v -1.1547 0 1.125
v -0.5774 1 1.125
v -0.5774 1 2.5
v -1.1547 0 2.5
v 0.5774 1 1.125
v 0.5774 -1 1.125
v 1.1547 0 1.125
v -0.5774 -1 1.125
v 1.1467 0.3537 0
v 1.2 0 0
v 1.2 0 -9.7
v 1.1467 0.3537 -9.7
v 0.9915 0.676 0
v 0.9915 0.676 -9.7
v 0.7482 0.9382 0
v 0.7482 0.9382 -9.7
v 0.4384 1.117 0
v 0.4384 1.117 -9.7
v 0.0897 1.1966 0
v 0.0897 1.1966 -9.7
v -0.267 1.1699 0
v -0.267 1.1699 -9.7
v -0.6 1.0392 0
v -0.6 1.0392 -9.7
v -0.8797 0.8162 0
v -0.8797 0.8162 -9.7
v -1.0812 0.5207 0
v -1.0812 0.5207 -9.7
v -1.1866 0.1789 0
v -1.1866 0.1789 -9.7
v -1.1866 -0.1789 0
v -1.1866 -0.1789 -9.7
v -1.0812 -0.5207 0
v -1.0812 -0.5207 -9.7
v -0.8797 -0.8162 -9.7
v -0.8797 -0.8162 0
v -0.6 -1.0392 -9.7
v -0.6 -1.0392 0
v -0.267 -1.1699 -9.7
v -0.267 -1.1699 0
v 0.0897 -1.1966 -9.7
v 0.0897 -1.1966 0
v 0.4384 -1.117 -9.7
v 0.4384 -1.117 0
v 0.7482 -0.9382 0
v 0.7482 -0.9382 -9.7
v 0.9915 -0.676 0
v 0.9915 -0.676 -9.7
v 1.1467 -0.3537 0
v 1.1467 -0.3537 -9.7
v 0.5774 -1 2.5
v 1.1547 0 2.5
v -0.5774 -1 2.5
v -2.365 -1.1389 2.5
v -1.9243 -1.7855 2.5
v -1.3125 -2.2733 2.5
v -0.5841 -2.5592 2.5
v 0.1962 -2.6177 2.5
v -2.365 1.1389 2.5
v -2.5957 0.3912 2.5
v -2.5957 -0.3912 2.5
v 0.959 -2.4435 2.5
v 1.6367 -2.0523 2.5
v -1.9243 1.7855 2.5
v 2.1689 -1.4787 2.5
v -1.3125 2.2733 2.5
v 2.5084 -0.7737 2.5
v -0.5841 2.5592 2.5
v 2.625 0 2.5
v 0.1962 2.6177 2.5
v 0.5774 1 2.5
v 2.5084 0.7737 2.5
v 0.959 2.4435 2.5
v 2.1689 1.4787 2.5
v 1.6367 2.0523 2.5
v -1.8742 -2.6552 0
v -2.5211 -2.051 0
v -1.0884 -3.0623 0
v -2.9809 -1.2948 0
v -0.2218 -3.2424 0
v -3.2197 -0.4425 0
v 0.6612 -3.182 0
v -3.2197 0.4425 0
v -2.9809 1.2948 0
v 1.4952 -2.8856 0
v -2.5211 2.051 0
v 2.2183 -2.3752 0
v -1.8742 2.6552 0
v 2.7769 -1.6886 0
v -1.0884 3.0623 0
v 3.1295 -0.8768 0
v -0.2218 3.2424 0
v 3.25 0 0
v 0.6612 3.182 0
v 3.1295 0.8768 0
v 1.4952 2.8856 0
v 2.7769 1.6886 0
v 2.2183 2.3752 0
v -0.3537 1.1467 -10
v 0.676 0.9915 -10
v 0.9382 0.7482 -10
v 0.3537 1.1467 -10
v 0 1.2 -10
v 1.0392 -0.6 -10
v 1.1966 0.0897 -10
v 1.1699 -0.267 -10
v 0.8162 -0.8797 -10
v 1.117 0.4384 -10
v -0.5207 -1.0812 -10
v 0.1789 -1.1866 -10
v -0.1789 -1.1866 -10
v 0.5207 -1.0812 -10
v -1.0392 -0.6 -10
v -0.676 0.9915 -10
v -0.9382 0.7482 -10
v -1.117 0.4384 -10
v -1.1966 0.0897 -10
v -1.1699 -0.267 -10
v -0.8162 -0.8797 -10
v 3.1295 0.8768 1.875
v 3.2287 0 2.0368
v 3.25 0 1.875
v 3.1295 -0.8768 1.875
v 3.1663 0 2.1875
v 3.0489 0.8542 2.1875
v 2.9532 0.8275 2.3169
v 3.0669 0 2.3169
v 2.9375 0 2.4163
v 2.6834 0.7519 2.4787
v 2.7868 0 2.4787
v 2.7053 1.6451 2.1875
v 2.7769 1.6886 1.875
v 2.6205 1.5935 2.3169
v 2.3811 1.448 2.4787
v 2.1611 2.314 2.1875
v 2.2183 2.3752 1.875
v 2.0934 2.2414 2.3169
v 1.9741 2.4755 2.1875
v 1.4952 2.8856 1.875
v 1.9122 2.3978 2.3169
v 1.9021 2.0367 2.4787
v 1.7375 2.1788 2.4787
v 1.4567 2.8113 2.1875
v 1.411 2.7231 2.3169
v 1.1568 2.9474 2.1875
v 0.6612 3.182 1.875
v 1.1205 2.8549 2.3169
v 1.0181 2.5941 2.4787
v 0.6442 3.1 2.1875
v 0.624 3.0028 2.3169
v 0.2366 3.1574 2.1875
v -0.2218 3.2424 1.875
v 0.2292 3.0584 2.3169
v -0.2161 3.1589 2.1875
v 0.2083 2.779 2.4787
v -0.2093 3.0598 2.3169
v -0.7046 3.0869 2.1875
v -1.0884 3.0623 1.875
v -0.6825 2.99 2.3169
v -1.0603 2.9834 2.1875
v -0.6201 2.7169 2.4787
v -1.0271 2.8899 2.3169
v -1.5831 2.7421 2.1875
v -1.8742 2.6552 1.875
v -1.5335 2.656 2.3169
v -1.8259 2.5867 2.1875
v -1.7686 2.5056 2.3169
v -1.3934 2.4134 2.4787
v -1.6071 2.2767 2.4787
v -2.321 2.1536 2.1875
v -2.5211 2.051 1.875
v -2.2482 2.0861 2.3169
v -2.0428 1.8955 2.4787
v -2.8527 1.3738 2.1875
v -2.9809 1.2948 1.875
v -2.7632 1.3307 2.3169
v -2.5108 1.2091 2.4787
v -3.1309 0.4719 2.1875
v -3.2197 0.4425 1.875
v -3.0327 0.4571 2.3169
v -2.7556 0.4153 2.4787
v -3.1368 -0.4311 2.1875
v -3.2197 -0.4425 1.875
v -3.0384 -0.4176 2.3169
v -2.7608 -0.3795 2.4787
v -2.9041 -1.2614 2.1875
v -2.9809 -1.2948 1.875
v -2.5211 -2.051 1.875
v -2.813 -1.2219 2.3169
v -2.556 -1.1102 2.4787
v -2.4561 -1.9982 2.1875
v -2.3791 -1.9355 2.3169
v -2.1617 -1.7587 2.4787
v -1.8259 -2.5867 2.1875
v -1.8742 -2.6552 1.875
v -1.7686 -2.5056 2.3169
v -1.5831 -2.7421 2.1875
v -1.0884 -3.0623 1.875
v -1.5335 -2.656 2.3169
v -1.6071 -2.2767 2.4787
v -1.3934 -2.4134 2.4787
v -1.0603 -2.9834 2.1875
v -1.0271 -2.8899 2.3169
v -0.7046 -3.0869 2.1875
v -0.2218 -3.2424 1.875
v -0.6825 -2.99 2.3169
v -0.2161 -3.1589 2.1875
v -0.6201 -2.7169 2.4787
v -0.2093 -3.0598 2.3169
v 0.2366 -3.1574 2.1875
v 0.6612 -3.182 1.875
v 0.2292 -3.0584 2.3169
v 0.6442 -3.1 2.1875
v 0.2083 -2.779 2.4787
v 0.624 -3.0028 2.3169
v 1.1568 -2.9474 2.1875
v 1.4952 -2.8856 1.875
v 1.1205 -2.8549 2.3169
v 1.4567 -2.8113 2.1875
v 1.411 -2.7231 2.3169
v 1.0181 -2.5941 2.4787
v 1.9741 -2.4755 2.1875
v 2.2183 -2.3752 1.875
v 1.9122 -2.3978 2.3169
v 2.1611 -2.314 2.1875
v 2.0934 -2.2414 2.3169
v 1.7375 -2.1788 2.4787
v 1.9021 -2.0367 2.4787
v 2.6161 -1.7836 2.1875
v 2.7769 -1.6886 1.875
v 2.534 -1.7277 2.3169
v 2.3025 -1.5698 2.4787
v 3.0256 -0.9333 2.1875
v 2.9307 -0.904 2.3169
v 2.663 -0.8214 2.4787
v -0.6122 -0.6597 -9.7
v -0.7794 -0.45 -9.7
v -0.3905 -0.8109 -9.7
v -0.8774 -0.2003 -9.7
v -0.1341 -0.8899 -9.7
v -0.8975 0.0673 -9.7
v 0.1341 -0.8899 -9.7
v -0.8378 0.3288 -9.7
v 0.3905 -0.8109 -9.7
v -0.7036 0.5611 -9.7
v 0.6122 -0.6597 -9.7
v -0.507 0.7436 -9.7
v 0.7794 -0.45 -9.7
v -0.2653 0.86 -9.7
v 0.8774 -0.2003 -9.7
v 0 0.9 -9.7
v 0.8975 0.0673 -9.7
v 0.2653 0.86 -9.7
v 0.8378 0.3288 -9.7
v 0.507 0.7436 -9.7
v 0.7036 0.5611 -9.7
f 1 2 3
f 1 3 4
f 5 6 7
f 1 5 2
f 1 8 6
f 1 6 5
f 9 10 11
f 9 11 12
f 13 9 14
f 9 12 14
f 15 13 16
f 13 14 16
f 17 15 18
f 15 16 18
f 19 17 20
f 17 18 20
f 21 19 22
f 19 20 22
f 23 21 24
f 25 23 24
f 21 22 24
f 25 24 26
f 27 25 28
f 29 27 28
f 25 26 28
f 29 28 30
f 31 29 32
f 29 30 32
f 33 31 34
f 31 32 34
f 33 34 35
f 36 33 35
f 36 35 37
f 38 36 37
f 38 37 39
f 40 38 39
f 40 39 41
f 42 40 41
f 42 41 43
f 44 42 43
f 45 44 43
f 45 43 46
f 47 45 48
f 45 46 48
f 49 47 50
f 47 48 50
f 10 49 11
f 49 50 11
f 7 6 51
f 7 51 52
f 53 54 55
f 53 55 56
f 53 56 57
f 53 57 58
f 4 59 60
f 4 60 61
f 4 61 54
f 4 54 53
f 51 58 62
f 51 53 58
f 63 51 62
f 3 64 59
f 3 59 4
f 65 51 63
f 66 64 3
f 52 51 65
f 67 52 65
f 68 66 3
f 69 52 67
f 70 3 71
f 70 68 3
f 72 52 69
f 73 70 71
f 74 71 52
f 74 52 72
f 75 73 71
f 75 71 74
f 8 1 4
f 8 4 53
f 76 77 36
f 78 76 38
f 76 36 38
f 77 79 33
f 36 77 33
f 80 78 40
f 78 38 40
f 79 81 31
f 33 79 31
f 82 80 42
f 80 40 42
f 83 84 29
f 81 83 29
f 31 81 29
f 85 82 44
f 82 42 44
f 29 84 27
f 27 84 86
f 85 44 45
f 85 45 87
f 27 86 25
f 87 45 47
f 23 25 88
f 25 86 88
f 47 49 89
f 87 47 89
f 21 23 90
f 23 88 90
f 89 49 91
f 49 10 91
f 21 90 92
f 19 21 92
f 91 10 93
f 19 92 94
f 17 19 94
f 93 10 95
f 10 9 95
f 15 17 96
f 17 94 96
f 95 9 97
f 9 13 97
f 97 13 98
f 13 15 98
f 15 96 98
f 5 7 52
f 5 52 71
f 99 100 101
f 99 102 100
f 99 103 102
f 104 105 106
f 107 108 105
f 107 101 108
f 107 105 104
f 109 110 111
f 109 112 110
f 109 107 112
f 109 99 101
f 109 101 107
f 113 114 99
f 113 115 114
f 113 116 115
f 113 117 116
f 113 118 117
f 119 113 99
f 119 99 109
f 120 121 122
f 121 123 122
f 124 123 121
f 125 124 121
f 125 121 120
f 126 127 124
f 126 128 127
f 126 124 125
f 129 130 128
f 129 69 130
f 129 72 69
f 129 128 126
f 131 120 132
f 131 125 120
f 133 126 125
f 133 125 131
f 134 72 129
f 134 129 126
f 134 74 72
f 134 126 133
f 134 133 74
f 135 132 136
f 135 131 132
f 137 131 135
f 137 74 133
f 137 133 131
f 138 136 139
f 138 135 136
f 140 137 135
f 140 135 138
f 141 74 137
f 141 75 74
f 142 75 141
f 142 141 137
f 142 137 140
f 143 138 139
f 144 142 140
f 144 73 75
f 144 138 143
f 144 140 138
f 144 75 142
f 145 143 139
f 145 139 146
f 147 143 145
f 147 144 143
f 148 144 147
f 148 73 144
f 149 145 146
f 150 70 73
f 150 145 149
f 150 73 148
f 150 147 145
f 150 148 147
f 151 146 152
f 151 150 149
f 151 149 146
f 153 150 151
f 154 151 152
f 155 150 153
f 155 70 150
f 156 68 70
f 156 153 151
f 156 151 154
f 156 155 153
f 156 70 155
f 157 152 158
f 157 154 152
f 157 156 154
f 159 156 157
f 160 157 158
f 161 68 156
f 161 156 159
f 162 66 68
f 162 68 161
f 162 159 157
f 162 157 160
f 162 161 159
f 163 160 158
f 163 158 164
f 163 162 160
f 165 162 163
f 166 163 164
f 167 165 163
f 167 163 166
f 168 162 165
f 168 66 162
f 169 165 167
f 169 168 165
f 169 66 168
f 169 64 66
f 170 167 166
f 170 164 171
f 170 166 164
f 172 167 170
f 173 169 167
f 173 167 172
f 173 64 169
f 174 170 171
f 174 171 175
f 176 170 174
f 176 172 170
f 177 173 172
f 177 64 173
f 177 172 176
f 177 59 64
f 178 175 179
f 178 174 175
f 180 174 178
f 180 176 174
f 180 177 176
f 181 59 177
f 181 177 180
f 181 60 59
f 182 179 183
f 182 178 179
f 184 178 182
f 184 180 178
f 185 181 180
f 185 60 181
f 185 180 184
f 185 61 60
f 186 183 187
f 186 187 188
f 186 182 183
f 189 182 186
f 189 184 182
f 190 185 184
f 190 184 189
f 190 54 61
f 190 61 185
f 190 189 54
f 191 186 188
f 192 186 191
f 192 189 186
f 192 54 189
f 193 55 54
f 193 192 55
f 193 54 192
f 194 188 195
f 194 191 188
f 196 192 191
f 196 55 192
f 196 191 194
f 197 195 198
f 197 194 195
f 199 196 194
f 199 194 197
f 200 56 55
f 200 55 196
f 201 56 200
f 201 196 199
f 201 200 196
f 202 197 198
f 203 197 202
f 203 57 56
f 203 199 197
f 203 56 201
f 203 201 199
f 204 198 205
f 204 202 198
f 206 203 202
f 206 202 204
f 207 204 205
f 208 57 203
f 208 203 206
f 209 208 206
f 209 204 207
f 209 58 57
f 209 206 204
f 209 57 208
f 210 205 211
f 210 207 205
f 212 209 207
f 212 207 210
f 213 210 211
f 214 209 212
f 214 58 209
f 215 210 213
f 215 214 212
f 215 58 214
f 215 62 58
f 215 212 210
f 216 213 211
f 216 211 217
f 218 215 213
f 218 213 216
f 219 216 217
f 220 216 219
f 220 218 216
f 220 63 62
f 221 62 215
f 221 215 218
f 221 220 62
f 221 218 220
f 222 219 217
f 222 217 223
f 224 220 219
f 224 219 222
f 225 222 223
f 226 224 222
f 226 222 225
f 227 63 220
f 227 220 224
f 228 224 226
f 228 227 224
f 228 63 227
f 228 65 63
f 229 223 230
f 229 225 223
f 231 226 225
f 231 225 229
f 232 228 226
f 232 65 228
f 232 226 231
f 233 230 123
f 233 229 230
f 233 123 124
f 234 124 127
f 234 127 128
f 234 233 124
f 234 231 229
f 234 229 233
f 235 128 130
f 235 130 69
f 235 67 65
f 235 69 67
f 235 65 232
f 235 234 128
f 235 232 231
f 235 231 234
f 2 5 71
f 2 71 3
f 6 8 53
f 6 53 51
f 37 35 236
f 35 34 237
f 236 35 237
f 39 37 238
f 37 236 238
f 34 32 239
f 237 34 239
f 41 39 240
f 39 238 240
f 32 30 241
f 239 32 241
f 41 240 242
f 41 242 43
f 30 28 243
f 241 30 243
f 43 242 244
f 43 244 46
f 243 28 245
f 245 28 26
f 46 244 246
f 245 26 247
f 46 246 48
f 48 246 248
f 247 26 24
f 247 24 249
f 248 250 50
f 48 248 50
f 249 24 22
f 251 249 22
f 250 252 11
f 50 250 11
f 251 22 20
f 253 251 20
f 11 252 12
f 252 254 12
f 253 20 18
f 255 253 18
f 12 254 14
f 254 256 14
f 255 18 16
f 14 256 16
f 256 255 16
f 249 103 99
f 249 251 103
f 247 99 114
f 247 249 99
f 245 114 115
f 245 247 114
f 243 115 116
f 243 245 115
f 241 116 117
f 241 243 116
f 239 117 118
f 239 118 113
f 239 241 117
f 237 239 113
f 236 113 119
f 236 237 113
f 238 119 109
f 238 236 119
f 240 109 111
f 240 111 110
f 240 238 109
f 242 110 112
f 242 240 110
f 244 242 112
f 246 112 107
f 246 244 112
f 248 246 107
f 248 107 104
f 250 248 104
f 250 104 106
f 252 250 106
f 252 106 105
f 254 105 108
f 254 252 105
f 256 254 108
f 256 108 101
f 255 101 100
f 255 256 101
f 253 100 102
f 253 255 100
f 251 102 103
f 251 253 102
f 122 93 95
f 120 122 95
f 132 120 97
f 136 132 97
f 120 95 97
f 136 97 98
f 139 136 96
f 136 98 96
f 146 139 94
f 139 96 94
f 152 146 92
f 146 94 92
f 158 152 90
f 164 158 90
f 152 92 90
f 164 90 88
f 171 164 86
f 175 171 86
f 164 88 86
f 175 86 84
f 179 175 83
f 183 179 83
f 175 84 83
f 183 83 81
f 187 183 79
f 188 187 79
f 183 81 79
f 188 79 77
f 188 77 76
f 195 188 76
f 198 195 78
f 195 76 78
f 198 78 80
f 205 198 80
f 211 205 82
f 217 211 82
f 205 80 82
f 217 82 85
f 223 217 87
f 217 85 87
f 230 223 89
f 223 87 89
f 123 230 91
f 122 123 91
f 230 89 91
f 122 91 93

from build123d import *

# Parameters (mm, degrees)
F_0015_CYLINDER_SKETCH_R    = 3.25
F_0015_CYLINDER_DEPTH       = 2.5
F_0016_FILLET_R             = 0.625
F_0017_EXTRUDE_DEPTH        = 1.385
F_0017_EXTRUDE_ROTATE_ANGLE = 120
F_0020_CYLINDER_SKETCH_R    = 1.2
F_0020_CYLINDER_DEPTH       = 9.7
F_0021_CONE_ROTATE_ANGLE    = 90


with BuildPart() as part:
    # 0015_cylinder_Sketch → 0015_cylinder (new body)
    with BuildSketch(Plane.XY):
        Circle(F_0015_CYLINDER_SKETCH_R)
    extrude(amount=F_0015_CYLINDER_DEPTH)

    # 0016_fillet
    f_0016_fillet_edges = [part.edges().sort_by_distance(p)[0] for p in [
        (-3.25, 0, 2.5),
    ]]
    fillet(f_0016_fillet_edges, radius=F_0016_FILLET_R)


with BuildPart() as body_2:
    # 0017_extrude_Sketch → 0017_extrude (new body)
    with BuildSketch(Plane.XY):
        Polygon((0, 0), (1.154700538, 0), (1.732050808, 1), (1.154700538, 2), (0, 2), (-0.577350269, 1), align=None)
    extrude(amount=F_0017_EXTRUDE_DEPTH)


with BuildPart() as body_2_1:
    # 0017_extrude_Rotate: read off the stored shape, not the designer's step
    # 0017_extrude_Rotate: moved
    add(body_2.part.rotate(Axis((0, 0, 0), (0, 0, 1)), F_0017_EXTRUDE_ROTATE_ANGLE))


with BuildPart() as body_2_2:
    # 0017_extrude_Translate: moved
    add(body_2_1.part.moved(Location((1.154700538, 0, 1.125))))


with BuildPart() as part_1:
    add(part.part)

    # 0019_sub: cut body 2
    add(body_2_2.part, mode=Mode.SUBTRACT)


with BuildPart() as body_2_2_1:
    # 0020_cylinder_Sketch → 0020_cylinder (new body)
    with BuildSketch(Plane.XY):
        Circle(F_0020_CYLINDER_SKETCH_R)
    extrude(amount=F_0020_CYLINDER_DEPTH)


with BuildPart() as body_2_2_2:
    # 0020_cylinder_Translate: moved
    add(body_2_2_1.part.moved(Location((0, 0, -9.7))))


with BuildPart() as body_3:
    # 0021_cone_Sketch → 0021_cone (revolve)
    with BuildSketch(Plane.XY, mode=Mode.PRIVATE) as f_0021_cone_sk:
        Polygon((0, 0), (1.2, 0), (0.9, 0.3), (0, 0.3), align=None)
    revolve(f_0021_cone_sk.sketch.rotate(Axis((0, -100, 0), (0, 1, 0)), 90), axis=Axis((0, -100, 0), (0, 1, 0)))


with BuildPart() as body_3_1:
    # 0021_cone_Rotate: moved
    add(body_3.part.rotate(Axis((0, 0, 0), (1, 0, 0)), F_0021_CONE_ROTATE_ANGLE))


with BuildPart() as body_3_2:
    # 0021_cone_Translate: moved
    add(body_3_1.part.moved(Location((0, 0, -10))))


with BuildPart() as body_2_2_3:
    add(body_2_2_2.part)

    # 0023_add: union body 3
    add(body_3_2.part)


with BuildPart() as part_2:
    add(part_1.part)

    # 0024_add: union body 2 2
    add(body_2_2_3.part)


solid = part_2.part
